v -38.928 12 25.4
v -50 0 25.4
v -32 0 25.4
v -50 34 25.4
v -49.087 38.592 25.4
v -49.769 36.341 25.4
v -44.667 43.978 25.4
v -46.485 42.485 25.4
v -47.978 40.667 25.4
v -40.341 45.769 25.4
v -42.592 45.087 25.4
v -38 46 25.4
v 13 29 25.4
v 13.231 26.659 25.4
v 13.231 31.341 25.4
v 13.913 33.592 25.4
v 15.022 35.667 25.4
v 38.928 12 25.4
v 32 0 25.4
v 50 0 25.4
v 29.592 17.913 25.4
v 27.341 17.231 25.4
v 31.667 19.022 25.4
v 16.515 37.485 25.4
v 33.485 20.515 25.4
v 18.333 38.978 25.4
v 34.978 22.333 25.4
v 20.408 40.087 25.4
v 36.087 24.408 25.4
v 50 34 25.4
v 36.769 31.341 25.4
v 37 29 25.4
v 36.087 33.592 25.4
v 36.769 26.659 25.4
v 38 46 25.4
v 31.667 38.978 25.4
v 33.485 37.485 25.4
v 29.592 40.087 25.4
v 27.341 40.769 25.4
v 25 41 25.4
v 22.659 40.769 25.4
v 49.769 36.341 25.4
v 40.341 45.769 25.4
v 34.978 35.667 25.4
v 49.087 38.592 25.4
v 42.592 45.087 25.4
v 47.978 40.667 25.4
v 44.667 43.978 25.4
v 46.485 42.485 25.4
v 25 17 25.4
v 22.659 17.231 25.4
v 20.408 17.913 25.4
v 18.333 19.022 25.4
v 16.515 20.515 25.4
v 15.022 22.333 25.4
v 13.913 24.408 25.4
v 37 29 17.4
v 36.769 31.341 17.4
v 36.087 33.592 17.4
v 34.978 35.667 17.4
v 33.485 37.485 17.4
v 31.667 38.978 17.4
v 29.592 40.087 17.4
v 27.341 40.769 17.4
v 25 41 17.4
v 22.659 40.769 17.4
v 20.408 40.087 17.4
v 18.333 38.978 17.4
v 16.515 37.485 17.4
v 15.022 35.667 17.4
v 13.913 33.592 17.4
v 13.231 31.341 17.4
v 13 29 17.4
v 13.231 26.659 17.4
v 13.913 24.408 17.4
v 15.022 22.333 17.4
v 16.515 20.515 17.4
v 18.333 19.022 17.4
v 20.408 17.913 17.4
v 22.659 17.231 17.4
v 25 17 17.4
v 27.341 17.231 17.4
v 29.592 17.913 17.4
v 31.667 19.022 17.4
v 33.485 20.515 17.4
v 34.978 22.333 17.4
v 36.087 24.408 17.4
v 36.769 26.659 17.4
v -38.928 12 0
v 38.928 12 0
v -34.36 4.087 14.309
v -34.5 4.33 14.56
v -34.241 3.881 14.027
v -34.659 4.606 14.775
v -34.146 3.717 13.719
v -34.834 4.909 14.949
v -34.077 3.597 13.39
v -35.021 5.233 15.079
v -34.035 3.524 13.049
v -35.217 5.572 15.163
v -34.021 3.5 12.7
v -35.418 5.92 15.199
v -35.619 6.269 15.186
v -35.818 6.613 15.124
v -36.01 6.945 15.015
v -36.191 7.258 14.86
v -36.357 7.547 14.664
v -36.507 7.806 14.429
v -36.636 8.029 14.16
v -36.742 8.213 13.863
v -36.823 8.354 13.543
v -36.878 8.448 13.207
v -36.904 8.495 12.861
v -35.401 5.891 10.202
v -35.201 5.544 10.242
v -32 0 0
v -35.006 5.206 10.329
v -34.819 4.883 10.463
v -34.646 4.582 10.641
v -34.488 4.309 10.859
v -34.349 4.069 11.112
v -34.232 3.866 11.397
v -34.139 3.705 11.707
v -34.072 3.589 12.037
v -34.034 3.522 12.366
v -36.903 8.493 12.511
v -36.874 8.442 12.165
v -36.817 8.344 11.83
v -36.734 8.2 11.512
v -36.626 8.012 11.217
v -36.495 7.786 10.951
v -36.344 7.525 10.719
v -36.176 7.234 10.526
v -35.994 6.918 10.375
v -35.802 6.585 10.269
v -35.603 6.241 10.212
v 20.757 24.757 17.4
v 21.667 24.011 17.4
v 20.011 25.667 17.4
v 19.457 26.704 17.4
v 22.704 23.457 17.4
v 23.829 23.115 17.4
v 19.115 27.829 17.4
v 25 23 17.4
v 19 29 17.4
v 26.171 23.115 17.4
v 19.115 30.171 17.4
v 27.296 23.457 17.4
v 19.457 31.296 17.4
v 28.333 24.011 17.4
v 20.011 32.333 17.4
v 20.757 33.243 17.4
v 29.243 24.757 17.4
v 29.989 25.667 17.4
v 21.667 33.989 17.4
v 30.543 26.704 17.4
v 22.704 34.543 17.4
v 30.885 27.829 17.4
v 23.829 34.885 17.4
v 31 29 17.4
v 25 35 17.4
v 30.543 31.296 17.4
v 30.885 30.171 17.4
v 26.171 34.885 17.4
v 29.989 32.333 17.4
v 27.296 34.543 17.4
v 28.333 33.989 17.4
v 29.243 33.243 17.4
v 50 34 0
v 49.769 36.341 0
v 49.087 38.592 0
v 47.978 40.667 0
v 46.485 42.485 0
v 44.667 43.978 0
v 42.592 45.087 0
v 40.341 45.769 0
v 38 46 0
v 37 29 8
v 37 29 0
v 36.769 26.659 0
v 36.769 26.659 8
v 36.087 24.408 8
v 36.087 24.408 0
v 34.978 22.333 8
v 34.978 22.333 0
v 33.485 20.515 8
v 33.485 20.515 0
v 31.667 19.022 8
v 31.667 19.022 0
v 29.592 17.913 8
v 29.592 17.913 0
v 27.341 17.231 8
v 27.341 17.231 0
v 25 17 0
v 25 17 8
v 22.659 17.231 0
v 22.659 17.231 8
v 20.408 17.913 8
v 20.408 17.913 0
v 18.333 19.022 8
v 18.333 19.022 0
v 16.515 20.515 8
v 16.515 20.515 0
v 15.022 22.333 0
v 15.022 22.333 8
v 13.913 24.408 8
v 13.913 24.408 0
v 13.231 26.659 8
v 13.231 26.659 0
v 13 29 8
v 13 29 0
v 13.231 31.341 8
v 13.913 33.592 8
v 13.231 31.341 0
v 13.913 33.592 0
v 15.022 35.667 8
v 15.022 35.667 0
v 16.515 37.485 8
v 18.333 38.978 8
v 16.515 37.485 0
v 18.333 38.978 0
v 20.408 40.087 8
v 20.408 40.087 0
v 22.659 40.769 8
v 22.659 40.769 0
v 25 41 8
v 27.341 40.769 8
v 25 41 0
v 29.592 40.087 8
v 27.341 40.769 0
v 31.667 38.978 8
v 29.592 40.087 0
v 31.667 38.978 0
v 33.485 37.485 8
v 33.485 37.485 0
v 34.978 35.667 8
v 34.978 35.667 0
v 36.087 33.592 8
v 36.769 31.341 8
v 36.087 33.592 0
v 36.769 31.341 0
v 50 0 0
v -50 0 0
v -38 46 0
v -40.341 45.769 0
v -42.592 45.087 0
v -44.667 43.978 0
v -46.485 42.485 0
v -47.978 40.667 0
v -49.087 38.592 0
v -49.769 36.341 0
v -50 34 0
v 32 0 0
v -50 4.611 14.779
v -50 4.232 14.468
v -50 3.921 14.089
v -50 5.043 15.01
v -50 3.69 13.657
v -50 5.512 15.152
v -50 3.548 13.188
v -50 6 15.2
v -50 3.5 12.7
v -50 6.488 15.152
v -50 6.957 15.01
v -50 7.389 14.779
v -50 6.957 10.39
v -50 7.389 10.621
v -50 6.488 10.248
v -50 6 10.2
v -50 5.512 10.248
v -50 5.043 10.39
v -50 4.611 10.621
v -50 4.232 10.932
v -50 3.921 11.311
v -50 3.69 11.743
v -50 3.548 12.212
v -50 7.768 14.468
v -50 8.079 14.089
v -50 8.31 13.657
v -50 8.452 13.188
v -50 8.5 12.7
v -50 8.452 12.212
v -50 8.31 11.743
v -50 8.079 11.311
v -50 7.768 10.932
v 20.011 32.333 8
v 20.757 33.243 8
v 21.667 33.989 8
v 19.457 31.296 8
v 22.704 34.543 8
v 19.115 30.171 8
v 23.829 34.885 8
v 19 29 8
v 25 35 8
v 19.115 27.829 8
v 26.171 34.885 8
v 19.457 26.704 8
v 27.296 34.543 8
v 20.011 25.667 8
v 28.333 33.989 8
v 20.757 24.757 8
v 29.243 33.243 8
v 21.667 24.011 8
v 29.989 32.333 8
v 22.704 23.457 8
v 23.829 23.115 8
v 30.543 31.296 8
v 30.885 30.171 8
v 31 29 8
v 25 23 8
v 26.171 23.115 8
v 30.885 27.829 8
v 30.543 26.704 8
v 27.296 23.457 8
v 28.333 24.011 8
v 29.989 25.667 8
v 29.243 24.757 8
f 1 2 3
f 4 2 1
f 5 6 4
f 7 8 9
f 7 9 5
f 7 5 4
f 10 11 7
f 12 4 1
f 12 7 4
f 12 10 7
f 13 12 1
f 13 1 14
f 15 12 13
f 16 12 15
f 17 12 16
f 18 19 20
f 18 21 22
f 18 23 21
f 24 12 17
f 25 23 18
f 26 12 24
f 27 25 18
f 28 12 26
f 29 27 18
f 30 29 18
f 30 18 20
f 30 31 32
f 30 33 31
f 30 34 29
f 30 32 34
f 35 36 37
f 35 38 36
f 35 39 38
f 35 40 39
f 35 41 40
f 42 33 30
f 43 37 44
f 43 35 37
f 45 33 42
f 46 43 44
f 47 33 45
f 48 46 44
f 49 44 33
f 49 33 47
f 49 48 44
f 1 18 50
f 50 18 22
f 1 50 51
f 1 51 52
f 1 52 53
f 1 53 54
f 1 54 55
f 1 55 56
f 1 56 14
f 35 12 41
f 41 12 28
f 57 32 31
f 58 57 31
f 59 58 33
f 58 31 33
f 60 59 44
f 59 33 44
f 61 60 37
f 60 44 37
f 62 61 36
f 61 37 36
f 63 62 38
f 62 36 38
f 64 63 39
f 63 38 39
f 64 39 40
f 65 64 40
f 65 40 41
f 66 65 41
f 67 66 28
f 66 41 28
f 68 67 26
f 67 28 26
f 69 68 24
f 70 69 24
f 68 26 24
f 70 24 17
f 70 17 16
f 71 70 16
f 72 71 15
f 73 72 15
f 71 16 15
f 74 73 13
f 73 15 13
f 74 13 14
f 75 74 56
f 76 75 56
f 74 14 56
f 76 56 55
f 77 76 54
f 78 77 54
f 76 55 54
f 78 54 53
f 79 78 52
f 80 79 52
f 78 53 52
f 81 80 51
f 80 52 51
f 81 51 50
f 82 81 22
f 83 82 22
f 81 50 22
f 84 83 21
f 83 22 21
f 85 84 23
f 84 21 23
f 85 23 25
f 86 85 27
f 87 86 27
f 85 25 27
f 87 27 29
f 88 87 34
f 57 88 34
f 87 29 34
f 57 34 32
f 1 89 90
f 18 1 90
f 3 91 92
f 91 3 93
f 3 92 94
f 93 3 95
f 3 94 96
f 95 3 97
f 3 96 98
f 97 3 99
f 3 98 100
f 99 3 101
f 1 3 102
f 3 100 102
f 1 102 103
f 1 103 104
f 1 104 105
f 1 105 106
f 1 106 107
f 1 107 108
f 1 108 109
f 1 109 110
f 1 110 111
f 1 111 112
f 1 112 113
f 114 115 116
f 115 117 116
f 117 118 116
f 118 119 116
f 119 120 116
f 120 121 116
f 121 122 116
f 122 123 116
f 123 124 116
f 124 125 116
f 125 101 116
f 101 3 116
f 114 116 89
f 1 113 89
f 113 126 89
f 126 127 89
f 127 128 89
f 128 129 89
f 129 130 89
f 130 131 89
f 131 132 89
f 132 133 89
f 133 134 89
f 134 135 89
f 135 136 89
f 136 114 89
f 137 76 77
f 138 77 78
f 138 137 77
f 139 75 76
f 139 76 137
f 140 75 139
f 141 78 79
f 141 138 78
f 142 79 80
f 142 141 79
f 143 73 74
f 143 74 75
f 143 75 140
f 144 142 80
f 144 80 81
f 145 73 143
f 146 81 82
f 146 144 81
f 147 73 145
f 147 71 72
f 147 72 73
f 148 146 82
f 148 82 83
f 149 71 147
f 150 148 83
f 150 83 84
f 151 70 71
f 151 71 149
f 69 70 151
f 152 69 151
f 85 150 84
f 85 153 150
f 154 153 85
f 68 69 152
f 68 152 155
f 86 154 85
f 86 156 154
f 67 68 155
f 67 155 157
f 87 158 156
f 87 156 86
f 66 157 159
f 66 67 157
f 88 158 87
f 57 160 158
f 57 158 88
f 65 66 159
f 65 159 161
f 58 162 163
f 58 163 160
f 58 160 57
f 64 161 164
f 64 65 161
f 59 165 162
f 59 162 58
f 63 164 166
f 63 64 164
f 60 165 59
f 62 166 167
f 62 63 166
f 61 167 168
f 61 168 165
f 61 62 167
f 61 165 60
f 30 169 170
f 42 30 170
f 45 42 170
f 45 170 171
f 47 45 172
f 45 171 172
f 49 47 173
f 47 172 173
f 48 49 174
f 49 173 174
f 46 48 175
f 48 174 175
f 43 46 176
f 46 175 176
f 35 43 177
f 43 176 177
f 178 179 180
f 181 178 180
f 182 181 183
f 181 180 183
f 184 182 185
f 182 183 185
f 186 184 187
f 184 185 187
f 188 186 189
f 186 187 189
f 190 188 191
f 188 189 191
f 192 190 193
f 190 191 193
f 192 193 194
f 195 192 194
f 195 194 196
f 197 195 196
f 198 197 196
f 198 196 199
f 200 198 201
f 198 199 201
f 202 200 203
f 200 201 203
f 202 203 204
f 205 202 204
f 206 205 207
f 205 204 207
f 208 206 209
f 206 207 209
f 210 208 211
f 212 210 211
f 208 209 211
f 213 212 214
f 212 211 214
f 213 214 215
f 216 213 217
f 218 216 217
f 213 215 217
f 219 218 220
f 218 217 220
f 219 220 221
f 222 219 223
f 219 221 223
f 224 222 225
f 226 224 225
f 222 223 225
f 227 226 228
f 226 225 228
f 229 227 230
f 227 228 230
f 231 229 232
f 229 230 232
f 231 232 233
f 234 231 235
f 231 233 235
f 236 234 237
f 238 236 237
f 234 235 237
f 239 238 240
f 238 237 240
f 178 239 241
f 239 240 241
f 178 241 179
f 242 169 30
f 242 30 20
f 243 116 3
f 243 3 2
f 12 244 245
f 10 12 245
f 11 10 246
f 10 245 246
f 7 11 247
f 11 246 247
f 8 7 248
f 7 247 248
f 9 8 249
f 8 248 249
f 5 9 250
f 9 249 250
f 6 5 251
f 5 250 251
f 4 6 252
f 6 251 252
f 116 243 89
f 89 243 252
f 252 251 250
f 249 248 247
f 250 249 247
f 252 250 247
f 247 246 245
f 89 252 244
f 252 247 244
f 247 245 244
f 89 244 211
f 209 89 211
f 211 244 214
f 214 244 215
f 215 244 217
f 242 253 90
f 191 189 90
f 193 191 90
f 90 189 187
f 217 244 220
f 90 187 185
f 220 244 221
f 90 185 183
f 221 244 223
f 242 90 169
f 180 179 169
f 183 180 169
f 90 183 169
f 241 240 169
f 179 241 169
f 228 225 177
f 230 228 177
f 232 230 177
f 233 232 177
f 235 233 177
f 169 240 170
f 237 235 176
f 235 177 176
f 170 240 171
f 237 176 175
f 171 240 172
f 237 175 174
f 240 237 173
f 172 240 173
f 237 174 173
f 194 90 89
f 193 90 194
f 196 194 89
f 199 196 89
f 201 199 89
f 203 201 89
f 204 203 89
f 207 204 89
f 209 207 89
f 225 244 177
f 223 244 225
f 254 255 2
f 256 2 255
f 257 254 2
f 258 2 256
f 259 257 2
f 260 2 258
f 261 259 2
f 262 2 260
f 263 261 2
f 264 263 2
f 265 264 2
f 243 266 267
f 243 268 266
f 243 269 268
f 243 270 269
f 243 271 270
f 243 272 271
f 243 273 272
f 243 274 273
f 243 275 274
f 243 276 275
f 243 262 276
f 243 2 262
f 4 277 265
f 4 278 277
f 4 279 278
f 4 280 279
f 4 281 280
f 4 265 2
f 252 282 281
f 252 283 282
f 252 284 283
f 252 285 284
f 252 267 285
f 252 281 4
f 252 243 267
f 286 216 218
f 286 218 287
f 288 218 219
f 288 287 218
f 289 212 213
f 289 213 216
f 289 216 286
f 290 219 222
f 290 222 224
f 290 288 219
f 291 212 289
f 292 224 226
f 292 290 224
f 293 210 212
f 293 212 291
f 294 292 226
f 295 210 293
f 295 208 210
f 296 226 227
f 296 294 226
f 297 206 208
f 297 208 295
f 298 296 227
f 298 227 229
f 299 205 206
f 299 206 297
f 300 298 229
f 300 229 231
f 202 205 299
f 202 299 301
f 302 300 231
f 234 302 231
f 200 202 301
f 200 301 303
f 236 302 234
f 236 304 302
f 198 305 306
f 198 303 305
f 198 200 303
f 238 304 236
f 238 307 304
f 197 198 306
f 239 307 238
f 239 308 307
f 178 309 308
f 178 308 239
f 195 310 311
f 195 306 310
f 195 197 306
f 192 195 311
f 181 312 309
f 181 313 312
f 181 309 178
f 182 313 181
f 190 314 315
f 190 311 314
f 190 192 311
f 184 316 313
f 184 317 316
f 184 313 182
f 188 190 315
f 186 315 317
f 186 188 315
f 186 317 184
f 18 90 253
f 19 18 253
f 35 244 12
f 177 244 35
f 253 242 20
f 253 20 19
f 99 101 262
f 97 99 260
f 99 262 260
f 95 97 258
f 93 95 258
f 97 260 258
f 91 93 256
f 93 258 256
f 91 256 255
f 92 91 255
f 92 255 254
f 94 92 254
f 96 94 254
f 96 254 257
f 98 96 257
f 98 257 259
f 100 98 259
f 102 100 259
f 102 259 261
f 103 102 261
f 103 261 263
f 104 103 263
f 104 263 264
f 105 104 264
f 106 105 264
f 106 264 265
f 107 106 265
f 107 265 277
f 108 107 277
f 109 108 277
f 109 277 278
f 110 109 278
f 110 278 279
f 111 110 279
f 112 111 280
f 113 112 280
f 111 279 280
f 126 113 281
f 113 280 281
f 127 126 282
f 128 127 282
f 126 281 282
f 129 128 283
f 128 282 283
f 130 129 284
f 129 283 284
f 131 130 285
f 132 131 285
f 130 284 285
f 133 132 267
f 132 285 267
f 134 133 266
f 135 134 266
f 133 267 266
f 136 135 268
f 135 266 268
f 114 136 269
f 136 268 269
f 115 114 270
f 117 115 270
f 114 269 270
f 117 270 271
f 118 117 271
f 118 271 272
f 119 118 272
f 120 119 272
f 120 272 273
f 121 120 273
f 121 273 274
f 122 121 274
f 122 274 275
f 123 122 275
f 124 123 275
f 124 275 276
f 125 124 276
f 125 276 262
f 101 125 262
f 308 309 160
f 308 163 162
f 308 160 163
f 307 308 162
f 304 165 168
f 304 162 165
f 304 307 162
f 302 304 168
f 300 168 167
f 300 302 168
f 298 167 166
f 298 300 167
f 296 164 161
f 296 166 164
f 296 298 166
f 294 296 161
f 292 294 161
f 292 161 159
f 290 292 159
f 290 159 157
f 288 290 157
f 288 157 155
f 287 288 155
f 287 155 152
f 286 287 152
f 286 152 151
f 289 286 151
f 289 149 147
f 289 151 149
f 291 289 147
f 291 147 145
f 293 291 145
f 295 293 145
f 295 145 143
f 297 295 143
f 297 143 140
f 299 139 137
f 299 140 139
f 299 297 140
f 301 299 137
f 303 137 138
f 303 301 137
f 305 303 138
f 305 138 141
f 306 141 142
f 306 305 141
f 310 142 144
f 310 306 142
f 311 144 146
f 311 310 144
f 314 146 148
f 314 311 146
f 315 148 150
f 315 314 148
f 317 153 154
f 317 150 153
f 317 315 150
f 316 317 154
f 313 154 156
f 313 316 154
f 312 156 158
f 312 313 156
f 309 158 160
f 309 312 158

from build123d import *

# Parameters (mm, degrees)
SKETCH002_R     = 6
PAD_DEPTH       = 25.4
SKETCH_R        = 12
POCKET_DEPTH    = 8
SKETCH003_R     = 12
POCKET001_DEPTH = 8
SKETCH004_R     = 2.5
POCKET002_DEPTH = 16


with BuildPart() as part:
    # Sketch002 → Pad (new body)
    with BuildSketch(Plane.XY):
        with BuildLine():
            Line((-32, 0), (-38.928203, 12))
            Line((-38.928203, 12), (38.928203, 12))
            Line((38.928203, 12), (32, 0))
            Line((50, 0), (32, 0))
            Line((50, 33.999968), (50, 0))
            ThreePointArc((50, 33.999968), (46.485286, 42.485276), (37.999982, 46))
            Line((-37.999961, 45.999976), (37.999982, 46))
            ThreePointArc((-37.999961, 45.999976), (-46.485271, 42.485268), (-50, 33.999968))
            Line((-50, 0), (-50, 33.999968))
            Line((-32, 0), (-50, 0))
        make_face()
        with Locations((25, 29)):
            Circle(SKETCH002_R, mode=Mode.SUBTRACT)
    extrude(amount=PAD_DEPTH)

    # Sketch → Pocket (cut)
    with BuildSketch(Plane.XY.offset(25.4)):
        with Locations((25, 29)):
            Circle(SKETCH_R)
    extrude(amount=-POCKET_DEPTH, mode=Mode.SUBTRACT)

    # Sketch003 → Pocket001 (cut)
    with BuildSketch(Plane(origin=(0, 0, 0), x_dir=(1, 0, 0), z_dir=(0, 0, -1))):
        with Locations((25, -29)):
            Circle(SKETCH003_R)
    extrude(amount=-POCKET001_DEPTH, mode=Mode.SUBTRACT)

    # Sketch004 → Pocket002 (cut)
    with BuildSketch(Plane(origin=(-50, 0, 0), x_dir=(0, -1, 0), z_dir=(-1, 0, 0))):
        with Locations((-6, 12.7)):
            Circle(SKETCH004_R)
    extrude(amount=-POCKET002_DEPTH, mode=Mode.SUBTRACT)


solid = part.part
